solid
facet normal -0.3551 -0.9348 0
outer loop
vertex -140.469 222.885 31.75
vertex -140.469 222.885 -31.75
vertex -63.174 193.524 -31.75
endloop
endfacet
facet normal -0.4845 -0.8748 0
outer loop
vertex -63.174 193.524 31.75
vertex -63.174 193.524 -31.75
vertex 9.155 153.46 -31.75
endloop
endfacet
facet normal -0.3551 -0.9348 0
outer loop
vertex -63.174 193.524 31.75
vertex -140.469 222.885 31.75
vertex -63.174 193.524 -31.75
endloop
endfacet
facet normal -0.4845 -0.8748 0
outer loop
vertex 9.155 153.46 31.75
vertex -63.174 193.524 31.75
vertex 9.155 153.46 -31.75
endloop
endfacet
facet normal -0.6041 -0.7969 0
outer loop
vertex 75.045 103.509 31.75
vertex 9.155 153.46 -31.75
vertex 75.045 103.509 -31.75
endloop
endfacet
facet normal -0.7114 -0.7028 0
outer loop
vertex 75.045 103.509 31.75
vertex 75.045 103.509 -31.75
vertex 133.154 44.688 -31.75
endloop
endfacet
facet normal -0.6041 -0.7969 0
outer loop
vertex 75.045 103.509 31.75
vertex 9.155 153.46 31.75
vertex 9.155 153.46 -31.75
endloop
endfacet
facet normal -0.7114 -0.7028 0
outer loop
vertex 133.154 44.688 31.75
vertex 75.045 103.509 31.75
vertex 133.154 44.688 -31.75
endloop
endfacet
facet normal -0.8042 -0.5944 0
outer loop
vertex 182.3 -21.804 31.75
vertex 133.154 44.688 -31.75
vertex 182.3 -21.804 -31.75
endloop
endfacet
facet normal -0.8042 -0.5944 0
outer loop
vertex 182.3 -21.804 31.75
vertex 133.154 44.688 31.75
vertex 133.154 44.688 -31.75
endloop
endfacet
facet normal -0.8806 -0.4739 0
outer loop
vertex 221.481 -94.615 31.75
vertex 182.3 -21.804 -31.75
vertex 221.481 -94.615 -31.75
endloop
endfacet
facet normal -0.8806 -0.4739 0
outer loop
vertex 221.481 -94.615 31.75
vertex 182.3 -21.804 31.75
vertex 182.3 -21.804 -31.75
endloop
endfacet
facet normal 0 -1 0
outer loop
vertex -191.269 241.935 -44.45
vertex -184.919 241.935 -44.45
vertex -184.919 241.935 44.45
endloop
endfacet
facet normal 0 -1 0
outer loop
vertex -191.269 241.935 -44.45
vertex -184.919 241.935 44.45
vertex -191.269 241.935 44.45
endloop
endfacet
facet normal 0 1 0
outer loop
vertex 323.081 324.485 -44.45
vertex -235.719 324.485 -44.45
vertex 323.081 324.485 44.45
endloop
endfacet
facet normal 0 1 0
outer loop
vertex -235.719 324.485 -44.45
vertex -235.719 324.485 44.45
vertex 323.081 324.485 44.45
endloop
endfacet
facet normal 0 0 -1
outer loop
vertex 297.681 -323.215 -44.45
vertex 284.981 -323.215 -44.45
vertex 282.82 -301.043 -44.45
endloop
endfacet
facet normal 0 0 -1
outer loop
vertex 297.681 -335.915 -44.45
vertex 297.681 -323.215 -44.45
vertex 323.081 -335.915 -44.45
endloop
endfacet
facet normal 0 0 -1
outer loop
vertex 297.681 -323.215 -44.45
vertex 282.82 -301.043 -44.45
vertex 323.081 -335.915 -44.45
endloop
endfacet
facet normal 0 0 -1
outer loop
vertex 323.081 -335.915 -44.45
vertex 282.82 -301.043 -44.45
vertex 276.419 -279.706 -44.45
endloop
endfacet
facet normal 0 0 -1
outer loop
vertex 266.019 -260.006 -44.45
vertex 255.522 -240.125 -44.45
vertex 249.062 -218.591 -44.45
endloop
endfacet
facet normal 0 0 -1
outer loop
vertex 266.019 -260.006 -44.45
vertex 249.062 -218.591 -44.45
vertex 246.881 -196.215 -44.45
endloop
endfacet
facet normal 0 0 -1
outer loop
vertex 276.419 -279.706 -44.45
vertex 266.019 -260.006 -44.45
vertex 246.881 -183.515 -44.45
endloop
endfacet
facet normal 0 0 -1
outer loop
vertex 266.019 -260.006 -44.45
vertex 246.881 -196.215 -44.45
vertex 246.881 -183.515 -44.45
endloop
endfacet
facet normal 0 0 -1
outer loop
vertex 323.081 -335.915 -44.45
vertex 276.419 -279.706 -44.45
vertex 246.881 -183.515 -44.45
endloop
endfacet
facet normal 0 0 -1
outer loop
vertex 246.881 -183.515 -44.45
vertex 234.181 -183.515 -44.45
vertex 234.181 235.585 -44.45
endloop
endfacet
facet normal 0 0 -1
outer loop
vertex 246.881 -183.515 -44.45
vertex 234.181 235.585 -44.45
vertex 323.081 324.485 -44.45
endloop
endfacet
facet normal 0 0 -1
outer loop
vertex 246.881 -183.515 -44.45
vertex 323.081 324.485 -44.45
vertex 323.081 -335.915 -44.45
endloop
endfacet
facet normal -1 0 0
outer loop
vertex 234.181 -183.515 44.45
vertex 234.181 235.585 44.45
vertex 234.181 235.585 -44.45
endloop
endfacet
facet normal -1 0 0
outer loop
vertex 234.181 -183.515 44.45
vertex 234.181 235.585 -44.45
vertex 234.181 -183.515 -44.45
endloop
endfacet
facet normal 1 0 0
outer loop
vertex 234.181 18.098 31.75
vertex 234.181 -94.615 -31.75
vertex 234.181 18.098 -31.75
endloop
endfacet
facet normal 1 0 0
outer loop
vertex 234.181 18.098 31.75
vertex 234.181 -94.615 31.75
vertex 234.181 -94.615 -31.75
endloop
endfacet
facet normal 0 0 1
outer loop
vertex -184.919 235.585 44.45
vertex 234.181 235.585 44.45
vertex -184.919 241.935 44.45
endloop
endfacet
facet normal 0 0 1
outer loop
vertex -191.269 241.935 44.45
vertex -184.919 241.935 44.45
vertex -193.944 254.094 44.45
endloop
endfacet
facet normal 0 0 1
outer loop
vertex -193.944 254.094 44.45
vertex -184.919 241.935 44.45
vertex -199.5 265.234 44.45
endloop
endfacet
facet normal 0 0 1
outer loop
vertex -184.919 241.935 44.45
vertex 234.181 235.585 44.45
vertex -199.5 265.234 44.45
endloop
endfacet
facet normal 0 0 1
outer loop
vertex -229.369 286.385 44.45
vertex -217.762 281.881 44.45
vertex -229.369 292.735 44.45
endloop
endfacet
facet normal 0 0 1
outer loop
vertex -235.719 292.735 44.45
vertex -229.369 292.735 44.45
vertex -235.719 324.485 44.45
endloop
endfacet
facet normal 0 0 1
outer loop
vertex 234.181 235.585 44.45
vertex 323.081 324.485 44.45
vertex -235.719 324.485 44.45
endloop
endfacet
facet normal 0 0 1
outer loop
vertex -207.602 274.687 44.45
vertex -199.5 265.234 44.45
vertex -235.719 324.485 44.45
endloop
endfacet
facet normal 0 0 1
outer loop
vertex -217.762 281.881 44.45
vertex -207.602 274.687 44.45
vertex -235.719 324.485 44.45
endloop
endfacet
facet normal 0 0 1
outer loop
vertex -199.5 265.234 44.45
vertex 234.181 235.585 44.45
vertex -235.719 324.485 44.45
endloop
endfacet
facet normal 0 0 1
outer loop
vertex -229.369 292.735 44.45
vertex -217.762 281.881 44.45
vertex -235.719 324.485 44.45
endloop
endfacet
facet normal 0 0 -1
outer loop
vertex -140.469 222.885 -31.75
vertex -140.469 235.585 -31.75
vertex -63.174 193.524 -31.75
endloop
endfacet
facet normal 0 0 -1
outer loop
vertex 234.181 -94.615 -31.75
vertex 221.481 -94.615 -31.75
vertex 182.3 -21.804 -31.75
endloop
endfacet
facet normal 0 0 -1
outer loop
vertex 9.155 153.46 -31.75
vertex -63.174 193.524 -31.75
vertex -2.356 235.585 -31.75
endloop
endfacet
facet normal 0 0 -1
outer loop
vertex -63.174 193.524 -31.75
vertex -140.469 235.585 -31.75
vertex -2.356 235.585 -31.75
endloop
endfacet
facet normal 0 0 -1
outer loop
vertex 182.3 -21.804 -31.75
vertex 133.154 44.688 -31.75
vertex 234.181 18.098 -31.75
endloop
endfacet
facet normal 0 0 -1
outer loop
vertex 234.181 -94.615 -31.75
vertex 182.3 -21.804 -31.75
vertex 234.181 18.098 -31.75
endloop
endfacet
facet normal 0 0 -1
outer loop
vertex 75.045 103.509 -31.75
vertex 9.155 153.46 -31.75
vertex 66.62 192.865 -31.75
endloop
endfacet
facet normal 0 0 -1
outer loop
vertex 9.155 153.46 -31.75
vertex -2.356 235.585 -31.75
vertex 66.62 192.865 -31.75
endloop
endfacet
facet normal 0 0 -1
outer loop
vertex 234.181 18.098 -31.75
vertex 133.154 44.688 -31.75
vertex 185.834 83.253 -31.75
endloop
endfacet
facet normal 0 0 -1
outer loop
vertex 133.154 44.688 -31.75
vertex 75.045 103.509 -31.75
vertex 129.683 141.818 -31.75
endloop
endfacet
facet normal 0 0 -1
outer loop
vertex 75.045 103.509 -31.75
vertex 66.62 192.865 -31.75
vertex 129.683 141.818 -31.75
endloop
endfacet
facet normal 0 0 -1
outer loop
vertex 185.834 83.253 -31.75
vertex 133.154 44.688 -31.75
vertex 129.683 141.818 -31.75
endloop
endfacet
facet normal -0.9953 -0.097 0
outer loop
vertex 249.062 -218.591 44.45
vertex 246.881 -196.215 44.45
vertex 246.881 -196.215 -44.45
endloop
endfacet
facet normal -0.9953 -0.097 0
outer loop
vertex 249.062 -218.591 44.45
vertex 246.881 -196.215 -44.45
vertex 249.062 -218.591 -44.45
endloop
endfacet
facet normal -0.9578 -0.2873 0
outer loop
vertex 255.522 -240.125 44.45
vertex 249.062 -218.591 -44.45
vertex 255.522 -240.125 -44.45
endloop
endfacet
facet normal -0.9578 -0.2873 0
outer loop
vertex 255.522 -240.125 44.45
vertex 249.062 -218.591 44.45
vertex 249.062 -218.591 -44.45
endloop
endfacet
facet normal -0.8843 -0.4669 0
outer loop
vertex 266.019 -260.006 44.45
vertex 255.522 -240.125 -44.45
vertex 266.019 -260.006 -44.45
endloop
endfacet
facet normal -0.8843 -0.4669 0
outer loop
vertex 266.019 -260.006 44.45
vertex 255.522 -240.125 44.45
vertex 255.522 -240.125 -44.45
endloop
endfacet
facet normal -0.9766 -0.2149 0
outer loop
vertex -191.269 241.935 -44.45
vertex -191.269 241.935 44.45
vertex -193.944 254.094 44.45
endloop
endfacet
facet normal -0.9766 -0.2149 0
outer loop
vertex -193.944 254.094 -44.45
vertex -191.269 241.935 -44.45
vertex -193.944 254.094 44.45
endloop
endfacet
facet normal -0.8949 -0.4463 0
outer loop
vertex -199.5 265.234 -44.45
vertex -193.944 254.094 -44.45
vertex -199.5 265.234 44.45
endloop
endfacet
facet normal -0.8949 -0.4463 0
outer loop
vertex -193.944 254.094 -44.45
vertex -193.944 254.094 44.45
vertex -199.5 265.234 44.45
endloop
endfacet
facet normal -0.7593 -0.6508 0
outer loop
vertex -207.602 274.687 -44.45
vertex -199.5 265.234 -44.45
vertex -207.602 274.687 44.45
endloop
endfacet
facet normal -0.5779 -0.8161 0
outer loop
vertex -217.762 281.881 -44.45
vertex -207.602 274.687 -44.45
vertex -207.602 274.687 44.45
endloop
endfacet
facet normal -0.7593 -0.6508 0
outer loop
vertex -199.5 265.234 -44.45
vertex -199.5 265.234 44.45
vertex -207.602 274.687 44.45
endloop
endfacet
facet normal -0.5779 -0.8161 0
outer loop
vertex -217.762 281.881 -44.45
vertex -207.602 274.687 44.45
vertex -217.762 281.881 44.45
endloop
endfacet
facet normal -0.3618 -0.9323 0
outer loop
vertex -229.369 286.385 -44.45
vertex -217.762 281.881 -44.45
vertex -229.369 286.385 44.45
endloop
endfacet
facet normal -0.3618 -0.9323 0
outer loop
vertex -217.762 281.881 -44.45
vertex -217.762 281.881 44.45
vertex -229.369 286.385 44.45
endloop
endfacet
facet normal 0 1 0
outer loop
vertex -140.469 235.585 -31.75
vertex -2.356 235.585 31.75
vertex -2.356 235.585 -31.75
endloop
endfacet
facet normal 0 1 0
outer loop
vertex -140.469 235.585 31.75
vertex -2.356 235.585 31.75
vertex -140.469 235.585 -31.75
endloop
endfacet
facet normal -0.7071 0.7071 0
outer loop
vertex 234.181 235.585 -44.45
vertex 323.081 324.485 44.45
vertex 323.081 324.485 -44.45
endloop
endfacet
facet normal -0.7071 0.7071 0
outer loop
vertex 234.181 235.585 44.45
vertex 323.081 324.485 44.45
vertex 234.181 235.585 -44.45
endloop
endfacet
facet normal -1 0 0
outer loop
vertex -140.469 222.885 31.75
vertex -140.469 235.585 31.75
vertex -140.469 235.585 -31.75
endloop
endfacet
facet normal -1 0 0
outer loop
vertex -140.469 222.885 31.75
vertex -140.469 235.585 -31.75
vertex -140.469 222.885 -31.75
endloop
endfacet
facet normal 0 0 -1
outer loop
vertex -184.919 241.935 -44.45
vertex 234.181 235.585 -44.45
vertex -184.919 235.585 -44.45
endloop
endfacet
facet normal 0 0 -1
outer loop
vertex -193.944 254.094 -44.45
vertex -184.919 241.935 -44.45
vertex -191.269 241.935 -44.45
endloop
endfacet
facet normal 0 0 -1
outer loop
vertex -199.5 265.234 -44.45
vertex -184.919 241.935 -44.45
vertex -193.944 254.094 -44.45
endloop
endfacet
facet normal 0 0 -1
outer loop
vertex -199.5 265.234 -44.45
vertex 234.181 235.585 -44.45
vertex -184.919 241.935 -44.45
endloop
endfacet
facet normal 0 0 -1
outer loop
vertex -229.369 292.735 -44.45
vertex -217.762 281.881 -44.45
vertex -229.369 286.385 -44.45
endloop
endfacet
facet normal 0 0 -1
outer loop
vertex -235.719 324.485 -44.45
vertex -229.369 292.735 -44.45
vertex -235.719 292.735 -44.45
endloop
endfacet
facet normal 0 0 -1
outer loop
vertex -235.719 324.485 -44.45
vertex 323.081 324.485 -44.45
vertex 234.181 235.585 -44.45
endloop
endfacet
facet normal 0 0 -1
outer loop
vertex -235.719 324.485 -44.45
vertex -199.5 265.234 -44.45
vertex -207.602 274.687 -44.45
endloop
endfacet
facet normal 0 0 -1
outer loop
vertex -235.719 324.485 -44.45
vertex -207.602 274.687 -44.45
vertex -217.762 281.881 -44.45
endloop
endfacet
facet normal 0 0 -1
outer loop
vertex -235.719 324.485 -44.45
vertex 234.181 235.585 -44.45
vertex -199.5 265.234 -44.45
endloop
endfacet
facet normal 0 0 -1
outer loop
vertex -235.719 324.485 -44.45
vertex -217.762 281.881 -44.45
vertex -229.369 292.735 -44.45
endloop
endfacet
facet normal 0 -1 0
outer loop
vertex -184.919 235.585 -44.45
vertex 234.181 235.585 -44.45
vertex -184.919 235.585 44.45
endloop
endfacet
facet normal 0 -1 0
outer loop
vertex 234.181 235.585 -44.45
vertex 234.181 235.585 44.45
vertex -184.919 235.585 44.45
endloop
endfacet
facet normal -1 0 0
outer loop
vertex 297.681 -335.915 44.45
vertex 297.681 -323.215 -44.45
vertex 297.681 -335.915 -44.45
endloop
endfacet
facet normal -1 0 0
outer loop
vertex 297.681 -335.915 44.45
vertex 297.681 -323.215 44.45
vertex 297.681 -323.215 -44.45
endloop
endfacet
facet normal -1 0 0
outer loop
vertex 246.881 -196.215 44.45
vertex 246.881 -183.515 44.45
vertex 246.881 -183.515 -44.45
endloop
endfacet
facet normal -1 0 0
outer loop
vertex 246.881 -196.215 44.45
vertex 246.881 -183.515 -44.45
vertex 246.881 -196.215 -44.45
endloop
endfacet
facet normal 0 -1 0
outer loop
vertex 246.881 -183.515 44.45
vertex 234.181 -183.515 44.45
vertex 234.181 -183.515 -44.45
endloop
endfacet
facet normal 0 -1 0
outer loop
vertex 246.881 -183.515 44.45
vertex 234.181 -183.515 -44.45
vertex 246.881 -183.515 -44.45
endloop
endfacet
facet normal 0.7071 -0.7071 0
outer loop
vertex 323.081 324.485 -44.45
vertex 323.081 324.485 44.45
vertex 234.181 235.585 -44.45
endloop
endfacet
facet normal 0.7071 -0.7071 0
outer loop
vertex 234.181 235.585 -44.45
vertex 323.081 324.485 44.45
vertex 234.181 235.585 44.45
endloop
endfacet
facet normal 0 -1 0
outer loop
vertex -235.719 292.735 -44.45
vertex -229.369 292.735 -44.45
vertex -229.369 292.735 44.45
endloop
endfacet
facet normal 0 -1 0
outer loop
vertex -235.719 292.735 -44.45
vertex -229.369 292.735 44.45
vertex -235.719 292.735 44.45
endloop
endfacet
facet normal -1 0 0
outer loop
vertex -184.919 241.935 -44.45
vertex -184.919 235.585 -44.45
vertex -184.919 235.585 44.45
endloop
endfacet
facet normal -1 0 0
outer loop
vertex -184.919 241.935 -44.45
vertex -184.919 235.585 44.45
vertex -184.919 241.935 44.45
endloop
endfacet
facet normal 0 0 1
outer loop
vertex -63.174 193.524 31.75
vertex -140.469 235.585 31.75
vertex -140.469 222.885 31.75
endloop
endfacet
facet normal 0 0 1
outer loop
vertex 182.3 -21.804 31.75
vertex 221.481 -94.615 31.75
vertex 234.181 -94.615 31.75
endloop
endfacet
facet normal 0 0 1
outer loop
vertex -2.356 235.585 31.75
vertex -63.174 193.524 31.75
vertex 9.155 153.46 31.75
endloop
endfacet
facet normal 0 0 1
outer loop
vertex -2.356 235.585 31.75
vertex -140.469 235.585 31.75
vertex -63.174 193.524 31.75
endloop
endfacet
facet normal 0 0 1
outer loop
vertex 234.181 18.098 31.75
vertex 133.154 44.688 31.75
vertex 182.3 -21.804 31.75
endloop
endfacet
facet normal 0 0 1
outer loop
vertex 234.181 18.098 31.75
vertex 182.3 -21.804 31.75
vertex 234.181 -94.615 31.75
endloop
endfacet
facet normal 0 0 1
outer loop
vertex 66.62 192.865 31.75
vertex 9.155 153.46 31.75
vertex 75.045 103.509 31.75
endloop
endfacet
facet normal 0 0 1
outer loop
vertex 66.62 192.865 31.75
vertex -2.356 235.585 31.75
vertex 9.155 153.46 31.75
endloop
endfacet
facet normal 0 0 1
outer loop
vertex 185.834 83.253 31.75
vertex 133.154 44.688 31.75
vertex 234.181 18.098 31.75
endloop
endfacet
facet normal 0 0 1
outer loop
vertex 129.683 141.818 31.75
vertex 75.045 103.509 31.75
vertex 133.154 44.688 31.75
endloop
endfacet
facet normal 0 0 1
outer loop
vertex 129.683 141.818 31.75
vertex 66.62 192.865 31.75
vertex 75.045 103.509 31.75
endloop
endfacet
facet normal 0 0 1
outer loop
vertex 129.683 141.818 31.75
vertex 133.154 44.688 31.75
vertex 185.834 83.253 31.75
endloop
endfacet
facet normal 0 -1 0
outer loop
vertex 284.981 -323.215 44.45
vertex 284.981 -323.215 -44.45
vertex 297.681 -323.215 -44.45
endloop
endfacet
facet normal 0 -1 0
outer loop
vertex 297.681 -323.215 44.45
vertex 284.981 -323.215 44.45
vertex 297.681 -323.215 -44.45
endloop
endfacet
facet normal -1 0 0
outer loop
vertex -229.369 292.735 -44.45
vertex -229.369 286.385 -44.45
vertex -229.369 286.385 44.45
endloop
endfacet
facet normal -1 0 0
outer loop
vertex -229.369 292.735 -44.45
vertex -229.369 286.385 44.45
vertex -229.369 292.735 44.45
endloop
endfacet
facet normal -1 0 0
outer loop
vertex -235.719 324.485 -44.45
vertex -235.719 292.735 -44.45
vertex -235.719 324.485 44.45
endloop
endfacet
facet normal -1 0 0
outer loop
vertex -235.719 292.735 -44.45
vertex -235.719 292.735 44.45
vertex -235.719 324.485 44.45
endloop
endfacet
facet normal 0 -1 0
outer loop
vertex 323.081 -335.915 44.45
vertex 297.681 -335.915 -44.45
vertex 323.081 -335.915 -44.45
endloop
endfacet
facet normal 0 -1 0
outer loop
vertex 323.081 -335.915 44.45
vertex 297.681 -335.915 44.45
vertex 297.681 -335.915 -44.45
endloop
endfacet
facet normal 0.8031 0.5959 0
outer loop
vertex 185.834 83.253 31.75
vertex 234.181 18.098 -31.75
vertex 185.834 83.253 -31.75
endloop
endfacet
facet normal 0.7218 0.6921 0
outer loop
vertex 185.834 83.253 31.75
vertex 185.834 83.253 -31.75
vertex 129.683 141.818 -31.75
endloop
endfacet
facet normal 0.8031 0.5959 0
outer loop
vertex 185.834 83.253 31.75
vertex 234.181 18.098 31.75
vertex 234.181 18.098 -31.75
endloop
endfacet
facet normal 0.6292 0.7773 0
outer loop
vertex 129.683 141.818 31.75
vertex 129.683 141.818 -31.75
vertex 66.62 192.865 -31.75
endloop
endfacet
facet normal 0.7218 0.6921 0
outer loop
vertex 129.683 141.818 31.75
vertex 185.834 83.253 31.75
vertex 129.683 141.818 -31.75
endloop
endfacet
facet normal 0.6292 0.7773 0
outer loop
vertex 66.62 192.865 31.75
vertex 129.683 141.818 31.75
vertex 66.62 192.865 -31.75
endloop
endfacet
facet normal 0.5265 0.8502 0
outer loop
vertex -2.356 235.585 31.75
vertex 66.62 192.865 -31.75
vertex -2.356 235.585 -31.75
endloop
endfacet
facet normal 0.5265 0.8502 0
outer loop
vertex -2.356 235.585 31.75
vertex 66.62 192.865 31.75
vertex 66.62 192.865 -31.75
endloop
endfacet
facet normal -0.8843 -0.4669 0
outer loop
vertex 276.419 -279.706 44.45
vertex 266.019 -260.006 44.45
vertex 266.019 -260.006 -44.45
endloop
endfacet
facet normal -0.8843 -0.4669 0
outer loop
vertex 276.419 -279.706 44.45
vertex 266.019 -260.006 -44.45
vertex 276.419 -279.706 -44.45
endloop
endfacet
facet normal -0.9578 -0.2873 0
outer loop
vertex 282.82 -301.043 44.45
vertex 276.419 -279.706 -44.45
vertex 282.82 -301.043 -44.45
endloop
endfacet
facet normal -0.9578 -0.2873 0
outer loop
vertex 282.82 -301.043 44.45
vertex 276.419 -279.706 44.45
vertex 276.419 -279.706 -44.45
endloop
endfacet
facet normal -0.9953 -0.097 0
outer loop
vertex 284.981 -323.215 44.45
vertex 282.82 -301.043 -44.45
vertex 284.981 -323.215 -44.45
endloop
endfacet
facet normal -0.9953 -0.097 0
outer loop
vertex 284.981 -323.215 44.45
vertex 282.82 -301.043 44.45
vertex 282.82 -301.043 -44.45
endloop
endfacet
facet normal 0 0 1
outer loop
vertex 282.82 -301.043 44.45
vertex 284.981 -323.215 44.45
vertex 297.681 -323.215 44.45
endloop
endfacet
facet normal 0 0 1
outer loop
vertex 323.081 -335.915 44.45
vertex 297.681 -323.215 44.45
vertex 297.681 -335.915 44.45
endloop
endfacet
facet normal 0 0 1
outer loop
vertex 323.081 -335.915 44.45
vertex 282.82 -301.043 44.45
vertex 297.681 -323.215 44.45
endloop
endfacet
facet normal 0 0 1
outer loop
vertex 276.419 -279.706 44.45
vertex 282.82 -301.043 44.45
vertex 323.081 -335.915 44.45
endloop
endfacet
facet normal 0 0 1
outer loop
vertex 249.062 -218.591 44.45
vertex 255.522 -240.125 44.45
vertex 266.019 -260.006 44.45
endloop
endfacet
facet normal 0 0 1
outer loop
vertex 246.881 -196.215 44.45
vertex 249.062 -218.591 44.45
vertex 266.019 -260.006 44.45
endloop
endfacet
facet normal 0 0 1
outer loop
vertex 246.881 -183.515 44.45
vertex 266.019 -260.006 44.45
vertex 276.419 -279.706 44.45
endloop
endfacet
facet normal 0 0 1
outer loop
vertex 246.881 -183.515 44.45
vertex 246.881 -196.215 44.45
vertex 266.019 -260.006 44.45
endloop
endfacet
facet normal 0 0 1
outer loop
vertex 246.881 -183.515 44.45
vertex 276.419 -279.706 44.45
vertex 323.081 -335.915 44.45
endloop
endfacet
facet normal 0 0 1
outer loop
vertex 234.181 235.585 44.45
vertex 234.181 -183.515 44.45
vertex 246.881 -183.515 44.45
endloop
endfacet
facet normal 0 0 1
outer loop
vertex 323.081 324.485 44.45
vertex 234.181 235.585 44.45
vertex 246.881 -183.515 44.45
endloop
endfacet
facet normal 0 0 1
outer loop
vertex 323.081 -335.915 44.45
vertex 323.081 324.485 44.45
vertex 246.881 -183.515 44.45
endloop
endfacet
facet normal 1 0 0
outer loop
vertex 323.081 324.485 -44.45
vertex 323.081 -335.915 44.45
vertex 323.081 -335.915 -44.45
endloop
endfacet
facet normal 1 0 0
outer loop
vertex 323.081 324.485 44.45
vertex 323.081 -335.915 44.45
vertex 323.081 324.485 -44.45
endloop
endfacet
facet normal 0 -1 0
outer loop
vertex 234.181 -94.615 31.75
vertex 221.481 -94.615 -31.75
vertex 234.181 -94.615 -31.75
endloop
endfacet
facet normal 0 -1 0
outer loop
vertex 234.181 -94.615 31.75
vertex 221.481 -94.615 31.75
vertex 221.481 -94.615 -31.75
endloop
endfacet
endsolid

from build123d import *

# Parameters (mm, degrees)
BOSS_EXTRUDE1_DEPTH = 44.45
BOSS_EXTRUDE2_DEPTH = 31.75
BOSS_EXTRUDE3_DEPTH = 44.45


with BuildPart() as part:
    # Sketch1 → Boss-Extrude1 (new body, symmetric)
    with BuildSketch(Plane.XY):
        with BuildLine():
            Line((-229.368776984, 286.385), (-229.368776984, 292.735))
            Line((-229.368776984, 292.735), (-235.718776984, 292.735))
            Line((-235.718776984, 292.735), (-235.718776984, 324.485))
            Line((-235.718776984, 324.485), (323.081223016, 324.485))
            Line((323.081223016, 324.485), (234.181223016, 235.585))
            Line((234.181223016, 235.585), (-184.918776984, 235.585))
            Line((-184.918776984, 235.585), (-184.918776984, 241.935))
            Line((-184.918776984, 241.935), (-191.268776984, 241.935))
            ThreePointArc((-191.268776984, 241.935), (-203.260423906, 270.210016924), (-229.368776984, 286.385))
        make_face()
    extrude(amount=BOSS_EXTRUDE1_DEPTH, both=True)


with BuildPart() as body_2:
    # Sketch1_3 → Boss-Extrude2 (new body, symmetric)
    with BuildSketch(Plane.XY):
        with BuildLine():
            ThreePointArc((234.181223016, 18.0975), (129.683318975, 141.818301445), (-2.356276984, 235.585))
            Line((-2.356276984, 235.585), (-140.468776984, 235.585))
            Line((-140.468776984, 235.585), (-140.468776984, 222.885))
            ThreePointArc((-140.468776984, 222.885), (75.044638848, 103.508794049), (221.481223016, -94.615))
            Line((221.481223016, -94.615), (234.181223016, -94.615))
            Line((234.181223016, -94.615), (234.181223016, 18.0975))
        make_face()
    extrude(amount=BOSS_EXTRUDE2_DEPTH, both=True)


with BuildPart() as body_3:
    # Sketch1_4 → Boss-Extrude3 (new body, symmetric)
    with BuildSketch(Plane.XY):
        with BuildLine():
            Line((323.081223016, -335.915), (323.081223016, 324.485))
            Line((323.081223016, 324.485), (234.181223016, 235.585))
            Line((234.181223016, 235.585), (234.181223016, -183.515))
            Line((234.181223016, -183.515), (246.881223016, -183.515))
            Line((246.881223016, -183.515), (246.881223016, -196.215))
            ThreePointArc((246.881223016, -196.215), (251.768629387, -229.515028089), (266.018608337, -260.006284404))
            ThreePointArc((266.018608337, -260.006284404), (280.138450492, -290.219081757), (284.981223016, -323.215))
            Line((284.981223016, -323.215), (297.681223016, -323.215))
            Line((297.681223016, -323.215), (297.681223016, -335.915))
            Line((297.681223016, -335.915), (323.081223016, -335.915))
        make_face()
    extrude(amount=BOSS_EXTRUDE3_DEPTH, both=True)


solid = Compound([part.part, body_2.part, body_3.part])
